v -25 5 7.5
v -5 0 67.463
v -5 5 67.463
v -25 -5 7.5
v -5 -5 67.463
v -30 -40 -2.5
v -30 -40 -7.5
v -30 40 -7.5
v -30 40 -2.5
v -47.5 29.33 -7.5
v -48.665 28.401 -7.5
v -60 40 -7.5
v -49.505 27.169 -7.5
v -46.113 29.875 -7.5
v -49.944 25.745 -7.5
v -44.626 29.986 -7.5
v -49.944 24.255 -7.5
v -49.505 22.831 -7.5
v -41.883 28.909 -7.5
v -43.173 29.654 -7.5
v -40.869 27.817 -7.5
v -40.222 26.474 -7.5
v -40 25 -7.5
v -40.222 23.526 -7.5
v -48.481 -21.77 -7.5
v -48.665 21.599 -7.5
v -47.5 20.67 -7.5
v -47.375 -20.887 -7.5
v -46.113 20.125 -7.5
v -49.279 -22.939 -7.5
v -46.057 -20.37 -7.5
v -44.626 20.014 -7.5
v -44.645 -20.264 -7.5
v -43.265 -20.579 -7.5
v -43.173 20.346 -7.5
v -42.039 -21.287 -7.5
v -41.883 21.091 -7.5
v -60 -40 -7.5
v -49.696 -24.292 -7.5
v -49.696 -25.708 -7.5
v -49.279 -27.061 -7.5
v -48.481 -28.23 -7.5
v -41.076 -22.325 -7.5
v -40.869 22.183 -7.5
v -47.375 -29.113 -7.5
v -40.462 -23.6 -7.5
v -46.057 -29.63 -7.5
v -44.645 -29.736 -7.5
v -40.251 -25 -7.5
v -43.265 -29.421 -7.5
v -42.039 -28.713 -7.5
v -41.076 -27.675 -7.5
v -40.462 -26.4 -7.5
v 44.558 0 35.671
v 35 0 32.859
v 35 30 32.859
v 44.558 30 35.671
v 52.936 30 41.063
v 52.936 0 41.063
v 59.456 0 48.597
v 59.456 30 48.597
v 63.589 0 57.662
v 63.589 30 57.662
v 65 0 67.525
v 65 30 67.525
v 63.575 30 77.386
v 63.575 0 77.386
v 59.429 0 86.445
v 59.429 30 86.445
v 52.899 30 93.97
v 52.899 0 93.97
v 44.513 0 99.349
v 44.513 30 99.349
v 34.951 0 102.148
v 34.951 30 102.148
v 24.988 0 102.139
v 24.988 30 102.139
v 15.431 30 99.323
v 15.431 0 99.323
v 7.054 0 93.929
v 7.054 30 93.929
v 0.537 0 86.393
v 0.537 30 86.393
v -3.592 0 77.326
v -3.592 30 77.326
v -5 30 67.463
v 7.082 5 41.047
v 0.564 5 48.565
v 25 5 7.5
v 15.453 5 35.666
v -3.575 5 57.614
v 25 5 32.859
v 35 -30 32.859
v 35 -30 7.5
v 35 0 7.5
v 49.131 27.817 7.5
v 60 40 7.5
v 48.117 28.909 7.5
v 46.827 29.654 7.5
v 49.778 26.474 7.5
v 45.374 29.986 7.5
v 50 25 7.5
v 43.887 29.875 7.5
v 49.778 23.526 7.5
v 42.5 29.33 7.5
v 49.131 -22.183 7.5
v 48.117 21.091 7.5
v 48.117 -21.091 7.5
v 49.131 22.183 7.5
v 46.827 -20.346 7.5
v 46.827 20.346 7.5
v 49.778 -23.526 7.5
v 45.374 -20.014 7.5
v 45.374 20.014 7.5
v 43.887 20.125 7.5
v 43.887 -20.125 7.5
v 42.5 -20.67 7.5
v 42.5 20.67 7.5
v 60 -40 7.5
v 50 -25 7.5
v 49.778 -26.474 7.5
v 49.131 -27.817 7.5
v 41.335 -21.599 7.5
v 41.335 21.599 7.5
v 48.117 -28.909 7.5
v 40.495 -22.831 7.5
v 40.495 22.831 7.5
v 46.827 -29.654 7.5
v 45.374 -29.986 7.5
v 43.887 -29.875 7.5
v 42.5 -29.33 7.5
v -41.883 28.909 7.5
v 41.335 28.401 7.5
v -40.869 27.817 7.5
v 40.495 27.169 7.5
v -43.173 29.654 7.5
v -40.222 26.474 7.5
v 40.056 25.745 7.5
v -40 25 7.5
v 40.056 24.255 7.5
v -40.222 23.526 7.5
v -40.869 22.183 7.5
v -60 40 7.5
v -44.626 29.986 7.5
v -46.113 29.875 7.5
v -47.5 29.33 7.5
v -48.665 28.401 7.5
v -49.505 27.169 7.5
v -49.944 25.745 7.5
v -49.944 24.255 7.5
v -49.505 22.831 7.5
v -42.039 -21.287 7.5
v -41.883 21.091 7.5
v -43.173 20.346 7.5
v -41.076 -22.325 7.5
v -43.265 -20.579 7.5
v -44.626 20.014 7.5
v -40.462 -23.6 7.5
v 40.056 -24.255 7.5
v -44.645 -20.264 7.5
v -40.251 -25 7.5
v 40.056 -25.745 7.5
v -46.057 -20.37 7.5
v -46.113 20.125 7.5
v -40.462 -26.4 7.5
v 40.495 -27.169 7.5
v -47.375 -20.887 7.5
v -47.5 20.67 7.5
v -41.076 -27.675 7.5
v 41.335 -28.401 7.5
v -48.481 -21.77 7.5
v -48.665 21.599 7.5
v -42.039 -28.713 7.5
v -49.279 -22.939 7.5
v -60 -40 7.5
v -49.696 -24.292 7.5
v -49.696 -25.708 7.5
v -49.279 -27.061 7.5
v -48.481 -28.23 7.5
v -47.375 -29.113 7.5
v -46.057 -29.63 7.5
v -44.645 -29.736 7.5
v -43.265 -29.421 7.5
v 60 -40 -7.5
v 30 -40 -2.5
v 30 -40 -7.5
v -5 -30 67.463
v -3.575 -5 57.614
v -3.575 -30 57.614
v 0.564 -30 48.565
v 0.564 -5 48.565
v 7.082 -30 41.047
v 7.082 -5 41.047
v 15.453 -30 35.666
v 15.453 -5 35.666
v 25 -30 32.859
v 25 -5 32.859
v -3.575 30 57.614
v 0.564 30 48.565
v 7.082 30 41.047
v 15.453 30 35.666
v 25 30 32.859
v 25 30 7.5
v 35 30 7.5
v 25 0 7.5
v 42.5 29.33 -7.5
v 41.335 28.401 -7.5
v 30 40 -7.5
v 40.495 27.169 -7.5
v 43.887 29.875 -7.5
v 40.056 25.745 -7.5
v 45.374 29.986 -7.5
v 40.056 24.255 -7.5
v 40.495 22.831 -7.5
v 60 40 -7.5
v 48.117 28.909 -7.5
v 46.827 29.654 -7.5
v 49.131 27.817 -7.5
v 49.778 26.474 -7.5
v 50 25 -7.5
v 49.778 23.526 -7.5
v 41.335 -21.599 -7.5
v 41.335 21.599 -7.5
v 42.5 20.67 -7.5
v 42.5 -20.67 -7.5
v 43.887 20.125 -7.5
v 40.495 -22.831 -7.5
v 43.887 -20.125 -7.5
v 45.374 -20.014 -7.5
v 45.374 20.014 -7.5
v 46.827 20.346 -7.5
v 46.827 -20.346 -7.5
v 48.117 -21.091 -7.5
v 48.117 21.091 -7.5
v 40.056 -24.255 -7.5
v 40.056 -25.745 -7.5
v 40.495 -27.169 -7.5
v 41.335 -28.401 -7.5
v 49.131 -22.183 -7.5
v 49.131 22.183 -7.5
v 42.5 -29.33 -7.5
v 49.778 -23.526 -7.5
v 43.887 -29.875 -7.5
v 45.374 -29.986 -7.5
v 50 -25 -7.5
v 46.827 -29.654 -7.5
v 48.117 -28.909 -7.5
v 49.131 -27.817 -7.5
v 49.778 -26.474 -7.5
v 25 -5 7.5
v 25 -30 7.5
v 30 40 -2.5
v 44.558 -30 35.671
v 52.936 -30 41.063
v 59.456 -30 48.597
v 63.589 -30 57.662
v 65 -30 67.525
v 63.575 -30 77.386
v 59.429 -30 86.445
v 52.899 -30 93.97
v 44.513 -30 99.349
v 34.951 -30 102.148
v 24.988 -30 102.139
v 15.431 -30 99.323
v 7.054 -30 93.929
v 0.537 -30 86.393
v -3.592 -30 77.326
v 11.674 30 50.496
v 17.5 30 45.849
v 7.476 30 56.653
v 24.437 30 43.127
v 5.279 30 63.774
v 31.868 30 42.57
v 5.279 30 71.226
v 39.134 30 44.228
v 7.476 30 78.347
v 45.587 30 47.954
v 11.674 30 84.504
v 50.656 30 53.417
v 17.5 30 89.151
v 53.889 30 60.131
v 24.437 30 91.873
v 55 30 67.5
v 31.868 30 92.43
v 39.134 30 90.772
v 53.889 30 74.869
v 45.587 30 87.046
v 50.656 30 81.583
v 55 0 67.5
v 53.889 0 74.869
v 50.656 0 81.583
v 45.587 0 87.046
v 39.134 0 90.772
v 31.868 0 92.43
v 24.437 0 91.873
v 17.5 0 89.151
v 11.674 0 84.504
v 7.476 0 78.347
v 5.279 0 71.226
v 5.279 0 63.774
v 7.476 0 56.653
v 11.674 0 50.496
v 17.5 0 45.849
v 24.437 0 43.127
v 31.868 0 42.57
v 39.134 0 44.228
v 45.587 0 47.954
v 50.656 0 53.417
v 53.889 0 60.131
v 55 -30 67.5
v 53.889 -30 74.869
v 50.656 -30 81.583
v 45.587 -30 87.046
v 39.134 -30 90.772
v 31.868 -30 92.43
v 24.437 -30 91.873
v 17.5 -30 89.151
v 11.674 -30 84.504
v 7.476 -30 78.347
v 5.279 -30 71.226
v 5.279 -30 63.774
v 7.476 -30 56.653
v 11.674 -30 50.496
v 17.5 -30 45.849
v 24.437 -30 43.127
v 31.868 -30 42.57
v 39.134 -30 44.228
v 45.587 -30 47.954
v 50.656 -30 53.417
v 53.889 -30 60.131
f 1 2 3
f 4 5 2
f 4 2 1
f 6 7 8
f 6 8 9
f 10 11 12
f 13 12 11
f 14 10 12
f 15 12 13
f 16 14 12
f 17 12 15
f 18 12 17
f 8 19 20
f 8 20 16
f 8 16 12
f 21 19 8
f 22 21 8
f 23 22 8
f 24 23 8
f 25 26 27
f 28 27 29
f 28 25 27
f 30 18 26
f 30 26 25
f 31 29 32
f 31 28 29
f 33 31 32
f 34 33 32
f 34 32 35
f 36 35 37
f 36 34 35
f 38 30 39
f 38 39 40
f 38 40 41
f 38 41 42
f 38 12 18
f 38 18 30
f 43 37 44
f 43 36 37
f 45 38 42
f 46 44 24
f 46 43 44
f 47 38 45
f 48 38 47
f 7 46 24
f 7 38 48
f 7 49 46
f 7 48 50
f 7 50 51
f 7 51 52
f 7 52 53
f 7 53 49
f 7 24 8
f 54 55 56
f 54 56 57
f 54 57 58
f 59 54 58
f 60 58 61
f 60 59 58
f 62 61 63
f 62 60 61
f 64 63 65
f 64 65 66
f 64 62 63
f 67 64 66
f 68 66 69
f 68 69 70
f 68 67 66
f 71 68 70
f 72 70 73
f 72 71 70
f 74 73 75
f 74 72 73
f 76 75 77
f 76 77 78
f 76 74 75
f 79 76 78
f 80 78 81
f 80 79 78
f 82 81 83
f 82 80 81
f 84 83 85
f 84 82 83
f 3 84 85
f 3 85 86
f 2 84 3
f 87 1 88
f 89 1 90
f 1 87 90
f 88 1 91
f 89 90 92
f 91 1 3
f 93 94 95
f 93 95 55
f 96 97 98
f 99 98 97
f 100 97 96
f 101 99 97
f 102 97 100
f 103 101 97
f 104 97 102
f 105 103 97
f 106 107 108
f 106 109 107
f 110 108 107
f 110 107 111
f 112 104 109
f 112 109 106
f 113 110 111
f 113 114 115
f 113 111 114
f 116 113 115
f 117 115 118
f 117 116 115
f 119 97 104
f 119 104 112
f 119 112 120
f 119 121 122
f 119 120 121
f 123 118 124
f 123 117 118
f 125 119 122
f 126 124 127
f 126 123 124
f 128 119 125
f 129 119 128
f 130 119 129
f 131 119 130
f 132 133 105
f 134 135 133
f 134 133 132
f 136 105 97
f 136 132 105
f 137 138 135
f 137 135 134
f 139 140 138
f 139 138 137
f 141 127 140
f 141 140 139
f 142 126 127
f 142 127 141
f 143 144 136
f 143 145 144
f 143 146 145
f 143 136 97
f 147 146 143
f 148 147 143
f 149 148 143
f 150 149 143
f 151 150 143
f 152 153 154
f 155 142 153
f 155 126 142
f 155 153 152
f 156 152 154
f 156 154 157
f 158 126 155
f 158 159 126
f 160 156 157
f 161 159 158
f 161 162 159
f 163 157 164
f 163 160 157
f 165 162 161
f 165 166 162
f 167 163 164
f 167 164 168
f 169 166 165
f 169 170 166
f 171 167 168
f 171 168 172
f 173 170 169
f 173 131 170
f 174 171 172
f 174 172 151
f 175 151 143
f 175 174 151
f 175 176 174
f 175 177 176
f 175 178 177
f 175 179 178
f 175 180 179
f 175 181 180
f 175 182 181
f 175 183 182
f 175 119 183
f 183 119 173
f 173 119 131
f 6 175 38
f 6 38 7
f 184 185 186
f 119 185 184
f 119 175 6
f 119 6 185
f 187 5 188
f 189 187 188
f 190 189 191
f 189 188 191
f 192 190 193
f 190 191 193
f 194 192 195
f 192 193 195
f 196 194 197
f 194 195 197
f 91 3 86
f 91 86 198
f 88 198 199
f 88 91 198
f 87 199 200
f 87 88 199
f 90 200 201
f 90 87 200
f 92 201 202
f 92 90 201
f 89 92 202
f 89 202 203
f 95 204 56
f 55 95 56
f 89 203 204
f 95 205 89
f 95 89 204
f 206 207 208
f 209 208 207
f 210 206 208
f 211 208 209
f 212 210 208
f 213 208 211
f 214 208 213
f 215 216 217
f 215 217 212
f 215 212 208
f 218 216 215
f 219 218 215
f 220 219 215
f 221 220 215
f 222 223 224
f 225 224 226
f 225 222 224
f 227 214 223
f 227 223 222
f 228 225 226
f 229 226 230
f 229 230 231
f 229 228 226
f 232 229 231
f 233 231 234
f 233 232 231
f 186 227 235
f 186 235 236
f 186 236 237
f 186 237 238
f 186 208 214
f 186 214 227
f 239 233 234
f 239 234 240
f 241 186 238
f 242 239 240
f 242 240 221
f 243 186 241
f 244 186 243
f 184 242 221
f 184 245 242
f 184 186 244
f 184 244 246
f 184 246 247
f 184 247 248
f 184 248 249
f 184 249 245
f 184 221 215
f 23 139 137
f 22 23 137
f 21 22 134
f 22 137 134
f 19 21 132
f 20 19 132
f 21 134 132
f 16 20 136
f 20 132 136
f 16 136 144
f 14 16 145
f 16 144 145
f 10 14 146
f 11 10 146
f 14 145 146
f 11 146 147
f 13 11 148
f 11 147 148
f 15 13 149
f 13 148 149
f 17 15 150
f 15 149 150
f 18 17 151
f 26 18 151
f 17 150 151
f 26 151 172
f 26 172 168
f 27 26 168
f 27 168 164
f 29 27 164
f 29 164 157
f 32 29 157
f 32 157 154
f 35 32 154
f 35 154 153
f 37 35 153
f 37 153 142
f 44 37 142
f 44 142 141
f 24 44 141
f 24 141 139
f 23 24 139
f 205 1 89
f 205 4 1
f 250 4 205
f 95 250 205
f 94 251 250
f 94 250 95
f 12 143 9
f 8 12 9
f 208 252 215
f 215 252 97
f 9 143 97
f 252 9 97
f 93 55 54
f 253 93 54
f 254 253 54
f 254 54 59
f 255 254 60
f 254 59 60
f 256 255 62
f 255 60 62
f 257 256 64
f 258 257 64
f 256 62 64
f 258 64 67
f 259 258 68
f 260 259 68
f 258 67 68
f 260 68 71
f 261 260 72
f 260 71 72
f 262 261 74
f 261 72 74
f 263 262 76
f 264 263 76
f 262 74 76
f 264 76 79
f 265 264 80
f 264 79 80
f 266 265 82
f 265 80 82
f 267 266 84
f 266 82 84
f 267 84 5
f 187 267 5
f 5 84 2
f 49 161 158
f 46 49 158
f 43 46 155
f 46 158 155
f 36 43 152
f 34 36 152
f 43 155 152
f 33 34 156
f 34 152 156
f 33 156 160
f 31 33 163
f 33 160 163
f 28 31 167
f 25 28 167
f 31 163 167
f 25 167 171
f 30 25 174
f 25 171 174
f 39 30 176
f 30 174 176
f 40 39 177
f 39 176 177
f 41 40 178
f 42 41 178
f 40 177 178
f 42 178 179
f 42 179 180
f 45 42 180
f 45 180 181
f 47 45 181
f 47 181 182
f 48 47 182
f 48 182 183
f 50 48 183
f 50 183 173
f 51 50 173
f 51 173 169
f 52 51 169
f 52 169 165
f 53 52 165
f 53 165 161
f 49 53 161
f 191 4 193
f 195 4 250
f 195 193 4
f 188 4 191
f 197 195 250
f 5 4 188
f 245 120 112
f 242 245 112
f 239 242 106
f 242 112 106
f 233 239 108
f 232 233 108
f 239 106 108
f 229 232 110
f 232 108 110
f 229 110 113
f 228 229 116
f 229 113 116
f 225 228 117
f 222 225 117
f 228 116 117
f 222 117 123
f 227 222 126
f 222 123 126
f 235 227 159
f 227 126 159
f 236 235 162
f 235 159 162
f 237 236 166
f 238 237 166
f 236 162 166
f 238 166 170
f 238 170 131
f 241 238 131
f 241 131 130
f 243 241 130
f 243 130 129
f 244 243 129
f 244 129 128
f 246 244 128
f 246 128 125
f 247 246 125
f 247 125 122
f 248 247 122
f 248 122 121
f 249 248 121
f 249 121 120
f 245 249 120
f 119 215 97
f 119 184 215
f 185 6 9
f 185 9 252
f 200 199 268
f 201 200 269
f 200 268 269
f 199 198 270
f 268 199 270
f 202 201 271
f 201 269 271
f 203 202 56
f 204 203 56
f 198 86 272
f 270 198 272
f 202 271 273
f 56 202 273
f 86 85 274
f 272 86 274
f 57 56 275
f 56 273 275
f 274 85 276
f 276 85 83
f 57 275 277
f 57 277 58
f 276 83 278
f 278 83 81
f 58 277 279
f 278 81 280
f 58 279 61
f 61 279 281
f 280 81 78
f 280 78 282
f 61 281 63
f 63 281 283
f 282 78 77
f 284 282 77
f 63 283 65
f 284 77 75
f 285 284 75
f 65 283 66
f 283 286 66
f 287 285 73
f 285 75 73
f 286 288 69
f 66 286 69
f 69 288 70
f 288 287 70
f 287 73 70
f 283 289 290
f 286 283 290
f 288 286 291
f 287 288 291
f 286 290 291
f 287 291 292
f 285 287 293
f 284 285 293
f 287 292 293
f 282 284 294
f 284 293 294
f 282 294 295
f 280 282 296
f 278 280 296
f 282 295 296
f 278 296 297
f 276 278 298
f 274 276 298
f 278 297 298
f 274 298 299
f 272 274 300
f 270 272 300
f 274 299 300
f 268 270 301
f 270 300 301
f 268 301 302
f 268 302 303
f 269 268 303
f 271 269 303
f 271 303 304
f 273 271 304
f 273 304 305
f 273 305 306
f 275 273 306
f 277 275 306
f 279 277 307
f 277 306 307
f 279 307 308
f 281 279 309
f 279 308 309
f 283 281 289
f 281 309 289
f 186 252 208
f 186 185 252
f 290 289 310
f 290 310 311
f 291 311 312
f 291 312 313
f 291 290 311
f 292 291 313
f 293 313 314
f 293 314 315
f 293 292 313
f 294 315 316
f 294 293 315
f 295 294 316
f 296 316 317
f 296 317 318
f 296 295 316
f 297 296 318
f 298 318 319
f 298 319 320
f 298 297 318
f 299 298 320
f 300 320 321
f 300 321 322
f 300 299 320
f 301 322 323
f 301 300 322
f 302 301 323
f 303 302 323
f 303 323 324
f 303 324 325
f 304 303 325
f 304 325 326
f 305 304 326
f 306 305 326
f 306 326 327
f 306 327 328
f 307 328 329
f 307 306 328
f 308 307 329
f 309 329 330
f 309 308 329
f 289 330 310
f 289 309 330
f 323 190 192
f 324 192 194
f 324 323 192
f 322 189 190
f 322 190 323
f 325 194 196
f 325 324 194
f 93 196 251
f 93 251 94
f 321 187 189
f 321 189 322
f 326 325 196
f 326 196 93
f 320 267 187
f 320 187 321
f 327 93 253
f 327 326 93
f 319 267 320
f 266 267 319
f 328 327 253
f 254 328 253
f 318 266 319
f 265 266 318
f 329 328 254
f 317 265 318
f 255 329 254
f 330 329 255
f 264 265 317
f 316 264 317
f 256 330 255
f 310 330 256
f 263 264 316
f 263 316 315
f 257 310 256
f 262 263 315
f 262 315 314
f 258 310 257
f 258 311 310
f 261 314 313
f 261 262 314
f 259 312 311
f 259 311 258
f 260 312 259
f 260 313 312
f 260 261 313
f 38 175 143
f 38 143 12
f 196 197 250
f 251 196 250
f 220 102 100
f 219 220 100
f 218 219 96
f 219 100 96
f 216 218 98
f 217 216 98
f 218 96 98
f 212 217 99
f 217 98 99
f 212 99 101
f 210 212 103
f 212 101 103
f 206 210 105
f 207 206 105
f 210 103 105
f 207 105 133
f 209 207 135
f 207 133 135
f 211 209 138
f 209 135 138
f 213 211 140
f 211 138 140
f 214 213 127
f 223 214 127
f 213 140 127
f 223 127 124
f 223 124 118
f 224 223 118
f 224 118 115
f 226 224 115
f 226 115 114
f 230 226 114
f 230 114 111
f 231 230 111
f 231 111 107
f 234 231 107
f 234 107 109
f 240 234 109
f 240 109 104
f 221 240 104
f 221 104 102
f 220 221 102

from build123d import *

# Parameters (mm, degrees)
F1_DEPTH      = 40
F1_DEPTH_BACK = 40
F2_DEPTH      = 5
F2_DEPTH_BACK = 5
F0_R          = 25
F3_DEPTH      = 30
F3_DEPTH_BACK = 30
F4_R          = 5
F4_R_2        = 4.7490283211
F5_DEPTH      = 25
F6_R          = 5
F7_DEPTH      = 25


with BuildPart() as f1:
    # F0 (on Front) → F1 (new body, two sides)
    with BuildSketch(Plane.XZ) as f1_sk:
        Polygon((60, -7.5), (60, 7.5), (35, 7.5), (25, 7.5), (-25, 7.5), (-60, 7.5), (-60, -7.5), (-30, -7.5), (-30, -2.5), (30, -2.5), (30, -7.5), align=None)
    extrude(amount=F1_DEPTH)
    extrude(f1_sk.sketch, amount=-F1_DEPTH_BACK)

    # F4 (on face) → F5 (cut)
    with BuildSketch(Plane.XY.offset(7.5)):
        with Locations((-45, 25)):
            Circle(F4_R)
        with Locations((-45, -25)):
            Circle(F4_R_2)
    extrude(amount=-F5_DEPTH, mode=Mode.SUBTRACT)

    # F6 (on face) → F7 (cut)
    with BuildSketch(Plane.XY.offset(7.5)):
        with Locations((45, -25)):
            Circle(F6_R)
        with Locations((45, 25)):
            Circle(F6_R)
    extrude(amount=-F7_DEPTH, mode=Mode.SUBTRACT)


with BuildPart() as f2:
    # F0 (on Front) → F2 (new body, two sides)
    with BuildSketch(Plane.XZ) as f2_sk:
        with BuildLine():
            Line((-25, 7.5), (25, 7.5))
            Line((25, 7.5), (25, 32.8589838486))
            ThreePointArc((25, 32.8589838486), (3.55471315, 44.573011462), (-4.9999800814, 67.462659662))
            Line((-4.9999800814, 67.462659662), (-25, 7.5))
        make_face()
    extrude(amount=F2_DEPTH)
    extrude(f2_sk.sketch, amount=-F2_DEPTH_BACK)

    # F0 (on Front) → F3 (join, two sides)
    with BuildSketch(Plane.XZ) as f3_sk:
        with BuildLine():
            ThreePointArc((25, 32.8589838486), (30, 32.5), (35, 32.8589838486))
            ThreePointArc((35, 32.8589838486), (56.4575131106, 44.5871215252), (65, 67.5))
            ThreePointArc((65, 67.5), (29.9813298283, 102.4999950204), (-4.9999800814, 67.462659662))
            ThreePointArc((-4.9999800814, 67.462659662), (3.55471315, 44.573011462), (25, 32.8589838486))
        make_face()
        with Locations((30, 67.5)):
            Circle(F0_R, mode=Mode.SUBTRACT)
        with BuildLine():
            Line((25, 7.5), (35, 7.5))
            Line((35, 7.5), (35, 32.8589838486))
            ThreePointArc((35, 32.8589838486), (30, 32.5), (25, 32.8589838486))
            Line((25, 32.8589838486), (25, 7.5))
        make_face()
    extrude(amount=F3_DEPTH)
    extrude(f3_sk.sketch, amount=-F3_DEPTH_BACK)


solid = Compound([f1.part, f2.part])
